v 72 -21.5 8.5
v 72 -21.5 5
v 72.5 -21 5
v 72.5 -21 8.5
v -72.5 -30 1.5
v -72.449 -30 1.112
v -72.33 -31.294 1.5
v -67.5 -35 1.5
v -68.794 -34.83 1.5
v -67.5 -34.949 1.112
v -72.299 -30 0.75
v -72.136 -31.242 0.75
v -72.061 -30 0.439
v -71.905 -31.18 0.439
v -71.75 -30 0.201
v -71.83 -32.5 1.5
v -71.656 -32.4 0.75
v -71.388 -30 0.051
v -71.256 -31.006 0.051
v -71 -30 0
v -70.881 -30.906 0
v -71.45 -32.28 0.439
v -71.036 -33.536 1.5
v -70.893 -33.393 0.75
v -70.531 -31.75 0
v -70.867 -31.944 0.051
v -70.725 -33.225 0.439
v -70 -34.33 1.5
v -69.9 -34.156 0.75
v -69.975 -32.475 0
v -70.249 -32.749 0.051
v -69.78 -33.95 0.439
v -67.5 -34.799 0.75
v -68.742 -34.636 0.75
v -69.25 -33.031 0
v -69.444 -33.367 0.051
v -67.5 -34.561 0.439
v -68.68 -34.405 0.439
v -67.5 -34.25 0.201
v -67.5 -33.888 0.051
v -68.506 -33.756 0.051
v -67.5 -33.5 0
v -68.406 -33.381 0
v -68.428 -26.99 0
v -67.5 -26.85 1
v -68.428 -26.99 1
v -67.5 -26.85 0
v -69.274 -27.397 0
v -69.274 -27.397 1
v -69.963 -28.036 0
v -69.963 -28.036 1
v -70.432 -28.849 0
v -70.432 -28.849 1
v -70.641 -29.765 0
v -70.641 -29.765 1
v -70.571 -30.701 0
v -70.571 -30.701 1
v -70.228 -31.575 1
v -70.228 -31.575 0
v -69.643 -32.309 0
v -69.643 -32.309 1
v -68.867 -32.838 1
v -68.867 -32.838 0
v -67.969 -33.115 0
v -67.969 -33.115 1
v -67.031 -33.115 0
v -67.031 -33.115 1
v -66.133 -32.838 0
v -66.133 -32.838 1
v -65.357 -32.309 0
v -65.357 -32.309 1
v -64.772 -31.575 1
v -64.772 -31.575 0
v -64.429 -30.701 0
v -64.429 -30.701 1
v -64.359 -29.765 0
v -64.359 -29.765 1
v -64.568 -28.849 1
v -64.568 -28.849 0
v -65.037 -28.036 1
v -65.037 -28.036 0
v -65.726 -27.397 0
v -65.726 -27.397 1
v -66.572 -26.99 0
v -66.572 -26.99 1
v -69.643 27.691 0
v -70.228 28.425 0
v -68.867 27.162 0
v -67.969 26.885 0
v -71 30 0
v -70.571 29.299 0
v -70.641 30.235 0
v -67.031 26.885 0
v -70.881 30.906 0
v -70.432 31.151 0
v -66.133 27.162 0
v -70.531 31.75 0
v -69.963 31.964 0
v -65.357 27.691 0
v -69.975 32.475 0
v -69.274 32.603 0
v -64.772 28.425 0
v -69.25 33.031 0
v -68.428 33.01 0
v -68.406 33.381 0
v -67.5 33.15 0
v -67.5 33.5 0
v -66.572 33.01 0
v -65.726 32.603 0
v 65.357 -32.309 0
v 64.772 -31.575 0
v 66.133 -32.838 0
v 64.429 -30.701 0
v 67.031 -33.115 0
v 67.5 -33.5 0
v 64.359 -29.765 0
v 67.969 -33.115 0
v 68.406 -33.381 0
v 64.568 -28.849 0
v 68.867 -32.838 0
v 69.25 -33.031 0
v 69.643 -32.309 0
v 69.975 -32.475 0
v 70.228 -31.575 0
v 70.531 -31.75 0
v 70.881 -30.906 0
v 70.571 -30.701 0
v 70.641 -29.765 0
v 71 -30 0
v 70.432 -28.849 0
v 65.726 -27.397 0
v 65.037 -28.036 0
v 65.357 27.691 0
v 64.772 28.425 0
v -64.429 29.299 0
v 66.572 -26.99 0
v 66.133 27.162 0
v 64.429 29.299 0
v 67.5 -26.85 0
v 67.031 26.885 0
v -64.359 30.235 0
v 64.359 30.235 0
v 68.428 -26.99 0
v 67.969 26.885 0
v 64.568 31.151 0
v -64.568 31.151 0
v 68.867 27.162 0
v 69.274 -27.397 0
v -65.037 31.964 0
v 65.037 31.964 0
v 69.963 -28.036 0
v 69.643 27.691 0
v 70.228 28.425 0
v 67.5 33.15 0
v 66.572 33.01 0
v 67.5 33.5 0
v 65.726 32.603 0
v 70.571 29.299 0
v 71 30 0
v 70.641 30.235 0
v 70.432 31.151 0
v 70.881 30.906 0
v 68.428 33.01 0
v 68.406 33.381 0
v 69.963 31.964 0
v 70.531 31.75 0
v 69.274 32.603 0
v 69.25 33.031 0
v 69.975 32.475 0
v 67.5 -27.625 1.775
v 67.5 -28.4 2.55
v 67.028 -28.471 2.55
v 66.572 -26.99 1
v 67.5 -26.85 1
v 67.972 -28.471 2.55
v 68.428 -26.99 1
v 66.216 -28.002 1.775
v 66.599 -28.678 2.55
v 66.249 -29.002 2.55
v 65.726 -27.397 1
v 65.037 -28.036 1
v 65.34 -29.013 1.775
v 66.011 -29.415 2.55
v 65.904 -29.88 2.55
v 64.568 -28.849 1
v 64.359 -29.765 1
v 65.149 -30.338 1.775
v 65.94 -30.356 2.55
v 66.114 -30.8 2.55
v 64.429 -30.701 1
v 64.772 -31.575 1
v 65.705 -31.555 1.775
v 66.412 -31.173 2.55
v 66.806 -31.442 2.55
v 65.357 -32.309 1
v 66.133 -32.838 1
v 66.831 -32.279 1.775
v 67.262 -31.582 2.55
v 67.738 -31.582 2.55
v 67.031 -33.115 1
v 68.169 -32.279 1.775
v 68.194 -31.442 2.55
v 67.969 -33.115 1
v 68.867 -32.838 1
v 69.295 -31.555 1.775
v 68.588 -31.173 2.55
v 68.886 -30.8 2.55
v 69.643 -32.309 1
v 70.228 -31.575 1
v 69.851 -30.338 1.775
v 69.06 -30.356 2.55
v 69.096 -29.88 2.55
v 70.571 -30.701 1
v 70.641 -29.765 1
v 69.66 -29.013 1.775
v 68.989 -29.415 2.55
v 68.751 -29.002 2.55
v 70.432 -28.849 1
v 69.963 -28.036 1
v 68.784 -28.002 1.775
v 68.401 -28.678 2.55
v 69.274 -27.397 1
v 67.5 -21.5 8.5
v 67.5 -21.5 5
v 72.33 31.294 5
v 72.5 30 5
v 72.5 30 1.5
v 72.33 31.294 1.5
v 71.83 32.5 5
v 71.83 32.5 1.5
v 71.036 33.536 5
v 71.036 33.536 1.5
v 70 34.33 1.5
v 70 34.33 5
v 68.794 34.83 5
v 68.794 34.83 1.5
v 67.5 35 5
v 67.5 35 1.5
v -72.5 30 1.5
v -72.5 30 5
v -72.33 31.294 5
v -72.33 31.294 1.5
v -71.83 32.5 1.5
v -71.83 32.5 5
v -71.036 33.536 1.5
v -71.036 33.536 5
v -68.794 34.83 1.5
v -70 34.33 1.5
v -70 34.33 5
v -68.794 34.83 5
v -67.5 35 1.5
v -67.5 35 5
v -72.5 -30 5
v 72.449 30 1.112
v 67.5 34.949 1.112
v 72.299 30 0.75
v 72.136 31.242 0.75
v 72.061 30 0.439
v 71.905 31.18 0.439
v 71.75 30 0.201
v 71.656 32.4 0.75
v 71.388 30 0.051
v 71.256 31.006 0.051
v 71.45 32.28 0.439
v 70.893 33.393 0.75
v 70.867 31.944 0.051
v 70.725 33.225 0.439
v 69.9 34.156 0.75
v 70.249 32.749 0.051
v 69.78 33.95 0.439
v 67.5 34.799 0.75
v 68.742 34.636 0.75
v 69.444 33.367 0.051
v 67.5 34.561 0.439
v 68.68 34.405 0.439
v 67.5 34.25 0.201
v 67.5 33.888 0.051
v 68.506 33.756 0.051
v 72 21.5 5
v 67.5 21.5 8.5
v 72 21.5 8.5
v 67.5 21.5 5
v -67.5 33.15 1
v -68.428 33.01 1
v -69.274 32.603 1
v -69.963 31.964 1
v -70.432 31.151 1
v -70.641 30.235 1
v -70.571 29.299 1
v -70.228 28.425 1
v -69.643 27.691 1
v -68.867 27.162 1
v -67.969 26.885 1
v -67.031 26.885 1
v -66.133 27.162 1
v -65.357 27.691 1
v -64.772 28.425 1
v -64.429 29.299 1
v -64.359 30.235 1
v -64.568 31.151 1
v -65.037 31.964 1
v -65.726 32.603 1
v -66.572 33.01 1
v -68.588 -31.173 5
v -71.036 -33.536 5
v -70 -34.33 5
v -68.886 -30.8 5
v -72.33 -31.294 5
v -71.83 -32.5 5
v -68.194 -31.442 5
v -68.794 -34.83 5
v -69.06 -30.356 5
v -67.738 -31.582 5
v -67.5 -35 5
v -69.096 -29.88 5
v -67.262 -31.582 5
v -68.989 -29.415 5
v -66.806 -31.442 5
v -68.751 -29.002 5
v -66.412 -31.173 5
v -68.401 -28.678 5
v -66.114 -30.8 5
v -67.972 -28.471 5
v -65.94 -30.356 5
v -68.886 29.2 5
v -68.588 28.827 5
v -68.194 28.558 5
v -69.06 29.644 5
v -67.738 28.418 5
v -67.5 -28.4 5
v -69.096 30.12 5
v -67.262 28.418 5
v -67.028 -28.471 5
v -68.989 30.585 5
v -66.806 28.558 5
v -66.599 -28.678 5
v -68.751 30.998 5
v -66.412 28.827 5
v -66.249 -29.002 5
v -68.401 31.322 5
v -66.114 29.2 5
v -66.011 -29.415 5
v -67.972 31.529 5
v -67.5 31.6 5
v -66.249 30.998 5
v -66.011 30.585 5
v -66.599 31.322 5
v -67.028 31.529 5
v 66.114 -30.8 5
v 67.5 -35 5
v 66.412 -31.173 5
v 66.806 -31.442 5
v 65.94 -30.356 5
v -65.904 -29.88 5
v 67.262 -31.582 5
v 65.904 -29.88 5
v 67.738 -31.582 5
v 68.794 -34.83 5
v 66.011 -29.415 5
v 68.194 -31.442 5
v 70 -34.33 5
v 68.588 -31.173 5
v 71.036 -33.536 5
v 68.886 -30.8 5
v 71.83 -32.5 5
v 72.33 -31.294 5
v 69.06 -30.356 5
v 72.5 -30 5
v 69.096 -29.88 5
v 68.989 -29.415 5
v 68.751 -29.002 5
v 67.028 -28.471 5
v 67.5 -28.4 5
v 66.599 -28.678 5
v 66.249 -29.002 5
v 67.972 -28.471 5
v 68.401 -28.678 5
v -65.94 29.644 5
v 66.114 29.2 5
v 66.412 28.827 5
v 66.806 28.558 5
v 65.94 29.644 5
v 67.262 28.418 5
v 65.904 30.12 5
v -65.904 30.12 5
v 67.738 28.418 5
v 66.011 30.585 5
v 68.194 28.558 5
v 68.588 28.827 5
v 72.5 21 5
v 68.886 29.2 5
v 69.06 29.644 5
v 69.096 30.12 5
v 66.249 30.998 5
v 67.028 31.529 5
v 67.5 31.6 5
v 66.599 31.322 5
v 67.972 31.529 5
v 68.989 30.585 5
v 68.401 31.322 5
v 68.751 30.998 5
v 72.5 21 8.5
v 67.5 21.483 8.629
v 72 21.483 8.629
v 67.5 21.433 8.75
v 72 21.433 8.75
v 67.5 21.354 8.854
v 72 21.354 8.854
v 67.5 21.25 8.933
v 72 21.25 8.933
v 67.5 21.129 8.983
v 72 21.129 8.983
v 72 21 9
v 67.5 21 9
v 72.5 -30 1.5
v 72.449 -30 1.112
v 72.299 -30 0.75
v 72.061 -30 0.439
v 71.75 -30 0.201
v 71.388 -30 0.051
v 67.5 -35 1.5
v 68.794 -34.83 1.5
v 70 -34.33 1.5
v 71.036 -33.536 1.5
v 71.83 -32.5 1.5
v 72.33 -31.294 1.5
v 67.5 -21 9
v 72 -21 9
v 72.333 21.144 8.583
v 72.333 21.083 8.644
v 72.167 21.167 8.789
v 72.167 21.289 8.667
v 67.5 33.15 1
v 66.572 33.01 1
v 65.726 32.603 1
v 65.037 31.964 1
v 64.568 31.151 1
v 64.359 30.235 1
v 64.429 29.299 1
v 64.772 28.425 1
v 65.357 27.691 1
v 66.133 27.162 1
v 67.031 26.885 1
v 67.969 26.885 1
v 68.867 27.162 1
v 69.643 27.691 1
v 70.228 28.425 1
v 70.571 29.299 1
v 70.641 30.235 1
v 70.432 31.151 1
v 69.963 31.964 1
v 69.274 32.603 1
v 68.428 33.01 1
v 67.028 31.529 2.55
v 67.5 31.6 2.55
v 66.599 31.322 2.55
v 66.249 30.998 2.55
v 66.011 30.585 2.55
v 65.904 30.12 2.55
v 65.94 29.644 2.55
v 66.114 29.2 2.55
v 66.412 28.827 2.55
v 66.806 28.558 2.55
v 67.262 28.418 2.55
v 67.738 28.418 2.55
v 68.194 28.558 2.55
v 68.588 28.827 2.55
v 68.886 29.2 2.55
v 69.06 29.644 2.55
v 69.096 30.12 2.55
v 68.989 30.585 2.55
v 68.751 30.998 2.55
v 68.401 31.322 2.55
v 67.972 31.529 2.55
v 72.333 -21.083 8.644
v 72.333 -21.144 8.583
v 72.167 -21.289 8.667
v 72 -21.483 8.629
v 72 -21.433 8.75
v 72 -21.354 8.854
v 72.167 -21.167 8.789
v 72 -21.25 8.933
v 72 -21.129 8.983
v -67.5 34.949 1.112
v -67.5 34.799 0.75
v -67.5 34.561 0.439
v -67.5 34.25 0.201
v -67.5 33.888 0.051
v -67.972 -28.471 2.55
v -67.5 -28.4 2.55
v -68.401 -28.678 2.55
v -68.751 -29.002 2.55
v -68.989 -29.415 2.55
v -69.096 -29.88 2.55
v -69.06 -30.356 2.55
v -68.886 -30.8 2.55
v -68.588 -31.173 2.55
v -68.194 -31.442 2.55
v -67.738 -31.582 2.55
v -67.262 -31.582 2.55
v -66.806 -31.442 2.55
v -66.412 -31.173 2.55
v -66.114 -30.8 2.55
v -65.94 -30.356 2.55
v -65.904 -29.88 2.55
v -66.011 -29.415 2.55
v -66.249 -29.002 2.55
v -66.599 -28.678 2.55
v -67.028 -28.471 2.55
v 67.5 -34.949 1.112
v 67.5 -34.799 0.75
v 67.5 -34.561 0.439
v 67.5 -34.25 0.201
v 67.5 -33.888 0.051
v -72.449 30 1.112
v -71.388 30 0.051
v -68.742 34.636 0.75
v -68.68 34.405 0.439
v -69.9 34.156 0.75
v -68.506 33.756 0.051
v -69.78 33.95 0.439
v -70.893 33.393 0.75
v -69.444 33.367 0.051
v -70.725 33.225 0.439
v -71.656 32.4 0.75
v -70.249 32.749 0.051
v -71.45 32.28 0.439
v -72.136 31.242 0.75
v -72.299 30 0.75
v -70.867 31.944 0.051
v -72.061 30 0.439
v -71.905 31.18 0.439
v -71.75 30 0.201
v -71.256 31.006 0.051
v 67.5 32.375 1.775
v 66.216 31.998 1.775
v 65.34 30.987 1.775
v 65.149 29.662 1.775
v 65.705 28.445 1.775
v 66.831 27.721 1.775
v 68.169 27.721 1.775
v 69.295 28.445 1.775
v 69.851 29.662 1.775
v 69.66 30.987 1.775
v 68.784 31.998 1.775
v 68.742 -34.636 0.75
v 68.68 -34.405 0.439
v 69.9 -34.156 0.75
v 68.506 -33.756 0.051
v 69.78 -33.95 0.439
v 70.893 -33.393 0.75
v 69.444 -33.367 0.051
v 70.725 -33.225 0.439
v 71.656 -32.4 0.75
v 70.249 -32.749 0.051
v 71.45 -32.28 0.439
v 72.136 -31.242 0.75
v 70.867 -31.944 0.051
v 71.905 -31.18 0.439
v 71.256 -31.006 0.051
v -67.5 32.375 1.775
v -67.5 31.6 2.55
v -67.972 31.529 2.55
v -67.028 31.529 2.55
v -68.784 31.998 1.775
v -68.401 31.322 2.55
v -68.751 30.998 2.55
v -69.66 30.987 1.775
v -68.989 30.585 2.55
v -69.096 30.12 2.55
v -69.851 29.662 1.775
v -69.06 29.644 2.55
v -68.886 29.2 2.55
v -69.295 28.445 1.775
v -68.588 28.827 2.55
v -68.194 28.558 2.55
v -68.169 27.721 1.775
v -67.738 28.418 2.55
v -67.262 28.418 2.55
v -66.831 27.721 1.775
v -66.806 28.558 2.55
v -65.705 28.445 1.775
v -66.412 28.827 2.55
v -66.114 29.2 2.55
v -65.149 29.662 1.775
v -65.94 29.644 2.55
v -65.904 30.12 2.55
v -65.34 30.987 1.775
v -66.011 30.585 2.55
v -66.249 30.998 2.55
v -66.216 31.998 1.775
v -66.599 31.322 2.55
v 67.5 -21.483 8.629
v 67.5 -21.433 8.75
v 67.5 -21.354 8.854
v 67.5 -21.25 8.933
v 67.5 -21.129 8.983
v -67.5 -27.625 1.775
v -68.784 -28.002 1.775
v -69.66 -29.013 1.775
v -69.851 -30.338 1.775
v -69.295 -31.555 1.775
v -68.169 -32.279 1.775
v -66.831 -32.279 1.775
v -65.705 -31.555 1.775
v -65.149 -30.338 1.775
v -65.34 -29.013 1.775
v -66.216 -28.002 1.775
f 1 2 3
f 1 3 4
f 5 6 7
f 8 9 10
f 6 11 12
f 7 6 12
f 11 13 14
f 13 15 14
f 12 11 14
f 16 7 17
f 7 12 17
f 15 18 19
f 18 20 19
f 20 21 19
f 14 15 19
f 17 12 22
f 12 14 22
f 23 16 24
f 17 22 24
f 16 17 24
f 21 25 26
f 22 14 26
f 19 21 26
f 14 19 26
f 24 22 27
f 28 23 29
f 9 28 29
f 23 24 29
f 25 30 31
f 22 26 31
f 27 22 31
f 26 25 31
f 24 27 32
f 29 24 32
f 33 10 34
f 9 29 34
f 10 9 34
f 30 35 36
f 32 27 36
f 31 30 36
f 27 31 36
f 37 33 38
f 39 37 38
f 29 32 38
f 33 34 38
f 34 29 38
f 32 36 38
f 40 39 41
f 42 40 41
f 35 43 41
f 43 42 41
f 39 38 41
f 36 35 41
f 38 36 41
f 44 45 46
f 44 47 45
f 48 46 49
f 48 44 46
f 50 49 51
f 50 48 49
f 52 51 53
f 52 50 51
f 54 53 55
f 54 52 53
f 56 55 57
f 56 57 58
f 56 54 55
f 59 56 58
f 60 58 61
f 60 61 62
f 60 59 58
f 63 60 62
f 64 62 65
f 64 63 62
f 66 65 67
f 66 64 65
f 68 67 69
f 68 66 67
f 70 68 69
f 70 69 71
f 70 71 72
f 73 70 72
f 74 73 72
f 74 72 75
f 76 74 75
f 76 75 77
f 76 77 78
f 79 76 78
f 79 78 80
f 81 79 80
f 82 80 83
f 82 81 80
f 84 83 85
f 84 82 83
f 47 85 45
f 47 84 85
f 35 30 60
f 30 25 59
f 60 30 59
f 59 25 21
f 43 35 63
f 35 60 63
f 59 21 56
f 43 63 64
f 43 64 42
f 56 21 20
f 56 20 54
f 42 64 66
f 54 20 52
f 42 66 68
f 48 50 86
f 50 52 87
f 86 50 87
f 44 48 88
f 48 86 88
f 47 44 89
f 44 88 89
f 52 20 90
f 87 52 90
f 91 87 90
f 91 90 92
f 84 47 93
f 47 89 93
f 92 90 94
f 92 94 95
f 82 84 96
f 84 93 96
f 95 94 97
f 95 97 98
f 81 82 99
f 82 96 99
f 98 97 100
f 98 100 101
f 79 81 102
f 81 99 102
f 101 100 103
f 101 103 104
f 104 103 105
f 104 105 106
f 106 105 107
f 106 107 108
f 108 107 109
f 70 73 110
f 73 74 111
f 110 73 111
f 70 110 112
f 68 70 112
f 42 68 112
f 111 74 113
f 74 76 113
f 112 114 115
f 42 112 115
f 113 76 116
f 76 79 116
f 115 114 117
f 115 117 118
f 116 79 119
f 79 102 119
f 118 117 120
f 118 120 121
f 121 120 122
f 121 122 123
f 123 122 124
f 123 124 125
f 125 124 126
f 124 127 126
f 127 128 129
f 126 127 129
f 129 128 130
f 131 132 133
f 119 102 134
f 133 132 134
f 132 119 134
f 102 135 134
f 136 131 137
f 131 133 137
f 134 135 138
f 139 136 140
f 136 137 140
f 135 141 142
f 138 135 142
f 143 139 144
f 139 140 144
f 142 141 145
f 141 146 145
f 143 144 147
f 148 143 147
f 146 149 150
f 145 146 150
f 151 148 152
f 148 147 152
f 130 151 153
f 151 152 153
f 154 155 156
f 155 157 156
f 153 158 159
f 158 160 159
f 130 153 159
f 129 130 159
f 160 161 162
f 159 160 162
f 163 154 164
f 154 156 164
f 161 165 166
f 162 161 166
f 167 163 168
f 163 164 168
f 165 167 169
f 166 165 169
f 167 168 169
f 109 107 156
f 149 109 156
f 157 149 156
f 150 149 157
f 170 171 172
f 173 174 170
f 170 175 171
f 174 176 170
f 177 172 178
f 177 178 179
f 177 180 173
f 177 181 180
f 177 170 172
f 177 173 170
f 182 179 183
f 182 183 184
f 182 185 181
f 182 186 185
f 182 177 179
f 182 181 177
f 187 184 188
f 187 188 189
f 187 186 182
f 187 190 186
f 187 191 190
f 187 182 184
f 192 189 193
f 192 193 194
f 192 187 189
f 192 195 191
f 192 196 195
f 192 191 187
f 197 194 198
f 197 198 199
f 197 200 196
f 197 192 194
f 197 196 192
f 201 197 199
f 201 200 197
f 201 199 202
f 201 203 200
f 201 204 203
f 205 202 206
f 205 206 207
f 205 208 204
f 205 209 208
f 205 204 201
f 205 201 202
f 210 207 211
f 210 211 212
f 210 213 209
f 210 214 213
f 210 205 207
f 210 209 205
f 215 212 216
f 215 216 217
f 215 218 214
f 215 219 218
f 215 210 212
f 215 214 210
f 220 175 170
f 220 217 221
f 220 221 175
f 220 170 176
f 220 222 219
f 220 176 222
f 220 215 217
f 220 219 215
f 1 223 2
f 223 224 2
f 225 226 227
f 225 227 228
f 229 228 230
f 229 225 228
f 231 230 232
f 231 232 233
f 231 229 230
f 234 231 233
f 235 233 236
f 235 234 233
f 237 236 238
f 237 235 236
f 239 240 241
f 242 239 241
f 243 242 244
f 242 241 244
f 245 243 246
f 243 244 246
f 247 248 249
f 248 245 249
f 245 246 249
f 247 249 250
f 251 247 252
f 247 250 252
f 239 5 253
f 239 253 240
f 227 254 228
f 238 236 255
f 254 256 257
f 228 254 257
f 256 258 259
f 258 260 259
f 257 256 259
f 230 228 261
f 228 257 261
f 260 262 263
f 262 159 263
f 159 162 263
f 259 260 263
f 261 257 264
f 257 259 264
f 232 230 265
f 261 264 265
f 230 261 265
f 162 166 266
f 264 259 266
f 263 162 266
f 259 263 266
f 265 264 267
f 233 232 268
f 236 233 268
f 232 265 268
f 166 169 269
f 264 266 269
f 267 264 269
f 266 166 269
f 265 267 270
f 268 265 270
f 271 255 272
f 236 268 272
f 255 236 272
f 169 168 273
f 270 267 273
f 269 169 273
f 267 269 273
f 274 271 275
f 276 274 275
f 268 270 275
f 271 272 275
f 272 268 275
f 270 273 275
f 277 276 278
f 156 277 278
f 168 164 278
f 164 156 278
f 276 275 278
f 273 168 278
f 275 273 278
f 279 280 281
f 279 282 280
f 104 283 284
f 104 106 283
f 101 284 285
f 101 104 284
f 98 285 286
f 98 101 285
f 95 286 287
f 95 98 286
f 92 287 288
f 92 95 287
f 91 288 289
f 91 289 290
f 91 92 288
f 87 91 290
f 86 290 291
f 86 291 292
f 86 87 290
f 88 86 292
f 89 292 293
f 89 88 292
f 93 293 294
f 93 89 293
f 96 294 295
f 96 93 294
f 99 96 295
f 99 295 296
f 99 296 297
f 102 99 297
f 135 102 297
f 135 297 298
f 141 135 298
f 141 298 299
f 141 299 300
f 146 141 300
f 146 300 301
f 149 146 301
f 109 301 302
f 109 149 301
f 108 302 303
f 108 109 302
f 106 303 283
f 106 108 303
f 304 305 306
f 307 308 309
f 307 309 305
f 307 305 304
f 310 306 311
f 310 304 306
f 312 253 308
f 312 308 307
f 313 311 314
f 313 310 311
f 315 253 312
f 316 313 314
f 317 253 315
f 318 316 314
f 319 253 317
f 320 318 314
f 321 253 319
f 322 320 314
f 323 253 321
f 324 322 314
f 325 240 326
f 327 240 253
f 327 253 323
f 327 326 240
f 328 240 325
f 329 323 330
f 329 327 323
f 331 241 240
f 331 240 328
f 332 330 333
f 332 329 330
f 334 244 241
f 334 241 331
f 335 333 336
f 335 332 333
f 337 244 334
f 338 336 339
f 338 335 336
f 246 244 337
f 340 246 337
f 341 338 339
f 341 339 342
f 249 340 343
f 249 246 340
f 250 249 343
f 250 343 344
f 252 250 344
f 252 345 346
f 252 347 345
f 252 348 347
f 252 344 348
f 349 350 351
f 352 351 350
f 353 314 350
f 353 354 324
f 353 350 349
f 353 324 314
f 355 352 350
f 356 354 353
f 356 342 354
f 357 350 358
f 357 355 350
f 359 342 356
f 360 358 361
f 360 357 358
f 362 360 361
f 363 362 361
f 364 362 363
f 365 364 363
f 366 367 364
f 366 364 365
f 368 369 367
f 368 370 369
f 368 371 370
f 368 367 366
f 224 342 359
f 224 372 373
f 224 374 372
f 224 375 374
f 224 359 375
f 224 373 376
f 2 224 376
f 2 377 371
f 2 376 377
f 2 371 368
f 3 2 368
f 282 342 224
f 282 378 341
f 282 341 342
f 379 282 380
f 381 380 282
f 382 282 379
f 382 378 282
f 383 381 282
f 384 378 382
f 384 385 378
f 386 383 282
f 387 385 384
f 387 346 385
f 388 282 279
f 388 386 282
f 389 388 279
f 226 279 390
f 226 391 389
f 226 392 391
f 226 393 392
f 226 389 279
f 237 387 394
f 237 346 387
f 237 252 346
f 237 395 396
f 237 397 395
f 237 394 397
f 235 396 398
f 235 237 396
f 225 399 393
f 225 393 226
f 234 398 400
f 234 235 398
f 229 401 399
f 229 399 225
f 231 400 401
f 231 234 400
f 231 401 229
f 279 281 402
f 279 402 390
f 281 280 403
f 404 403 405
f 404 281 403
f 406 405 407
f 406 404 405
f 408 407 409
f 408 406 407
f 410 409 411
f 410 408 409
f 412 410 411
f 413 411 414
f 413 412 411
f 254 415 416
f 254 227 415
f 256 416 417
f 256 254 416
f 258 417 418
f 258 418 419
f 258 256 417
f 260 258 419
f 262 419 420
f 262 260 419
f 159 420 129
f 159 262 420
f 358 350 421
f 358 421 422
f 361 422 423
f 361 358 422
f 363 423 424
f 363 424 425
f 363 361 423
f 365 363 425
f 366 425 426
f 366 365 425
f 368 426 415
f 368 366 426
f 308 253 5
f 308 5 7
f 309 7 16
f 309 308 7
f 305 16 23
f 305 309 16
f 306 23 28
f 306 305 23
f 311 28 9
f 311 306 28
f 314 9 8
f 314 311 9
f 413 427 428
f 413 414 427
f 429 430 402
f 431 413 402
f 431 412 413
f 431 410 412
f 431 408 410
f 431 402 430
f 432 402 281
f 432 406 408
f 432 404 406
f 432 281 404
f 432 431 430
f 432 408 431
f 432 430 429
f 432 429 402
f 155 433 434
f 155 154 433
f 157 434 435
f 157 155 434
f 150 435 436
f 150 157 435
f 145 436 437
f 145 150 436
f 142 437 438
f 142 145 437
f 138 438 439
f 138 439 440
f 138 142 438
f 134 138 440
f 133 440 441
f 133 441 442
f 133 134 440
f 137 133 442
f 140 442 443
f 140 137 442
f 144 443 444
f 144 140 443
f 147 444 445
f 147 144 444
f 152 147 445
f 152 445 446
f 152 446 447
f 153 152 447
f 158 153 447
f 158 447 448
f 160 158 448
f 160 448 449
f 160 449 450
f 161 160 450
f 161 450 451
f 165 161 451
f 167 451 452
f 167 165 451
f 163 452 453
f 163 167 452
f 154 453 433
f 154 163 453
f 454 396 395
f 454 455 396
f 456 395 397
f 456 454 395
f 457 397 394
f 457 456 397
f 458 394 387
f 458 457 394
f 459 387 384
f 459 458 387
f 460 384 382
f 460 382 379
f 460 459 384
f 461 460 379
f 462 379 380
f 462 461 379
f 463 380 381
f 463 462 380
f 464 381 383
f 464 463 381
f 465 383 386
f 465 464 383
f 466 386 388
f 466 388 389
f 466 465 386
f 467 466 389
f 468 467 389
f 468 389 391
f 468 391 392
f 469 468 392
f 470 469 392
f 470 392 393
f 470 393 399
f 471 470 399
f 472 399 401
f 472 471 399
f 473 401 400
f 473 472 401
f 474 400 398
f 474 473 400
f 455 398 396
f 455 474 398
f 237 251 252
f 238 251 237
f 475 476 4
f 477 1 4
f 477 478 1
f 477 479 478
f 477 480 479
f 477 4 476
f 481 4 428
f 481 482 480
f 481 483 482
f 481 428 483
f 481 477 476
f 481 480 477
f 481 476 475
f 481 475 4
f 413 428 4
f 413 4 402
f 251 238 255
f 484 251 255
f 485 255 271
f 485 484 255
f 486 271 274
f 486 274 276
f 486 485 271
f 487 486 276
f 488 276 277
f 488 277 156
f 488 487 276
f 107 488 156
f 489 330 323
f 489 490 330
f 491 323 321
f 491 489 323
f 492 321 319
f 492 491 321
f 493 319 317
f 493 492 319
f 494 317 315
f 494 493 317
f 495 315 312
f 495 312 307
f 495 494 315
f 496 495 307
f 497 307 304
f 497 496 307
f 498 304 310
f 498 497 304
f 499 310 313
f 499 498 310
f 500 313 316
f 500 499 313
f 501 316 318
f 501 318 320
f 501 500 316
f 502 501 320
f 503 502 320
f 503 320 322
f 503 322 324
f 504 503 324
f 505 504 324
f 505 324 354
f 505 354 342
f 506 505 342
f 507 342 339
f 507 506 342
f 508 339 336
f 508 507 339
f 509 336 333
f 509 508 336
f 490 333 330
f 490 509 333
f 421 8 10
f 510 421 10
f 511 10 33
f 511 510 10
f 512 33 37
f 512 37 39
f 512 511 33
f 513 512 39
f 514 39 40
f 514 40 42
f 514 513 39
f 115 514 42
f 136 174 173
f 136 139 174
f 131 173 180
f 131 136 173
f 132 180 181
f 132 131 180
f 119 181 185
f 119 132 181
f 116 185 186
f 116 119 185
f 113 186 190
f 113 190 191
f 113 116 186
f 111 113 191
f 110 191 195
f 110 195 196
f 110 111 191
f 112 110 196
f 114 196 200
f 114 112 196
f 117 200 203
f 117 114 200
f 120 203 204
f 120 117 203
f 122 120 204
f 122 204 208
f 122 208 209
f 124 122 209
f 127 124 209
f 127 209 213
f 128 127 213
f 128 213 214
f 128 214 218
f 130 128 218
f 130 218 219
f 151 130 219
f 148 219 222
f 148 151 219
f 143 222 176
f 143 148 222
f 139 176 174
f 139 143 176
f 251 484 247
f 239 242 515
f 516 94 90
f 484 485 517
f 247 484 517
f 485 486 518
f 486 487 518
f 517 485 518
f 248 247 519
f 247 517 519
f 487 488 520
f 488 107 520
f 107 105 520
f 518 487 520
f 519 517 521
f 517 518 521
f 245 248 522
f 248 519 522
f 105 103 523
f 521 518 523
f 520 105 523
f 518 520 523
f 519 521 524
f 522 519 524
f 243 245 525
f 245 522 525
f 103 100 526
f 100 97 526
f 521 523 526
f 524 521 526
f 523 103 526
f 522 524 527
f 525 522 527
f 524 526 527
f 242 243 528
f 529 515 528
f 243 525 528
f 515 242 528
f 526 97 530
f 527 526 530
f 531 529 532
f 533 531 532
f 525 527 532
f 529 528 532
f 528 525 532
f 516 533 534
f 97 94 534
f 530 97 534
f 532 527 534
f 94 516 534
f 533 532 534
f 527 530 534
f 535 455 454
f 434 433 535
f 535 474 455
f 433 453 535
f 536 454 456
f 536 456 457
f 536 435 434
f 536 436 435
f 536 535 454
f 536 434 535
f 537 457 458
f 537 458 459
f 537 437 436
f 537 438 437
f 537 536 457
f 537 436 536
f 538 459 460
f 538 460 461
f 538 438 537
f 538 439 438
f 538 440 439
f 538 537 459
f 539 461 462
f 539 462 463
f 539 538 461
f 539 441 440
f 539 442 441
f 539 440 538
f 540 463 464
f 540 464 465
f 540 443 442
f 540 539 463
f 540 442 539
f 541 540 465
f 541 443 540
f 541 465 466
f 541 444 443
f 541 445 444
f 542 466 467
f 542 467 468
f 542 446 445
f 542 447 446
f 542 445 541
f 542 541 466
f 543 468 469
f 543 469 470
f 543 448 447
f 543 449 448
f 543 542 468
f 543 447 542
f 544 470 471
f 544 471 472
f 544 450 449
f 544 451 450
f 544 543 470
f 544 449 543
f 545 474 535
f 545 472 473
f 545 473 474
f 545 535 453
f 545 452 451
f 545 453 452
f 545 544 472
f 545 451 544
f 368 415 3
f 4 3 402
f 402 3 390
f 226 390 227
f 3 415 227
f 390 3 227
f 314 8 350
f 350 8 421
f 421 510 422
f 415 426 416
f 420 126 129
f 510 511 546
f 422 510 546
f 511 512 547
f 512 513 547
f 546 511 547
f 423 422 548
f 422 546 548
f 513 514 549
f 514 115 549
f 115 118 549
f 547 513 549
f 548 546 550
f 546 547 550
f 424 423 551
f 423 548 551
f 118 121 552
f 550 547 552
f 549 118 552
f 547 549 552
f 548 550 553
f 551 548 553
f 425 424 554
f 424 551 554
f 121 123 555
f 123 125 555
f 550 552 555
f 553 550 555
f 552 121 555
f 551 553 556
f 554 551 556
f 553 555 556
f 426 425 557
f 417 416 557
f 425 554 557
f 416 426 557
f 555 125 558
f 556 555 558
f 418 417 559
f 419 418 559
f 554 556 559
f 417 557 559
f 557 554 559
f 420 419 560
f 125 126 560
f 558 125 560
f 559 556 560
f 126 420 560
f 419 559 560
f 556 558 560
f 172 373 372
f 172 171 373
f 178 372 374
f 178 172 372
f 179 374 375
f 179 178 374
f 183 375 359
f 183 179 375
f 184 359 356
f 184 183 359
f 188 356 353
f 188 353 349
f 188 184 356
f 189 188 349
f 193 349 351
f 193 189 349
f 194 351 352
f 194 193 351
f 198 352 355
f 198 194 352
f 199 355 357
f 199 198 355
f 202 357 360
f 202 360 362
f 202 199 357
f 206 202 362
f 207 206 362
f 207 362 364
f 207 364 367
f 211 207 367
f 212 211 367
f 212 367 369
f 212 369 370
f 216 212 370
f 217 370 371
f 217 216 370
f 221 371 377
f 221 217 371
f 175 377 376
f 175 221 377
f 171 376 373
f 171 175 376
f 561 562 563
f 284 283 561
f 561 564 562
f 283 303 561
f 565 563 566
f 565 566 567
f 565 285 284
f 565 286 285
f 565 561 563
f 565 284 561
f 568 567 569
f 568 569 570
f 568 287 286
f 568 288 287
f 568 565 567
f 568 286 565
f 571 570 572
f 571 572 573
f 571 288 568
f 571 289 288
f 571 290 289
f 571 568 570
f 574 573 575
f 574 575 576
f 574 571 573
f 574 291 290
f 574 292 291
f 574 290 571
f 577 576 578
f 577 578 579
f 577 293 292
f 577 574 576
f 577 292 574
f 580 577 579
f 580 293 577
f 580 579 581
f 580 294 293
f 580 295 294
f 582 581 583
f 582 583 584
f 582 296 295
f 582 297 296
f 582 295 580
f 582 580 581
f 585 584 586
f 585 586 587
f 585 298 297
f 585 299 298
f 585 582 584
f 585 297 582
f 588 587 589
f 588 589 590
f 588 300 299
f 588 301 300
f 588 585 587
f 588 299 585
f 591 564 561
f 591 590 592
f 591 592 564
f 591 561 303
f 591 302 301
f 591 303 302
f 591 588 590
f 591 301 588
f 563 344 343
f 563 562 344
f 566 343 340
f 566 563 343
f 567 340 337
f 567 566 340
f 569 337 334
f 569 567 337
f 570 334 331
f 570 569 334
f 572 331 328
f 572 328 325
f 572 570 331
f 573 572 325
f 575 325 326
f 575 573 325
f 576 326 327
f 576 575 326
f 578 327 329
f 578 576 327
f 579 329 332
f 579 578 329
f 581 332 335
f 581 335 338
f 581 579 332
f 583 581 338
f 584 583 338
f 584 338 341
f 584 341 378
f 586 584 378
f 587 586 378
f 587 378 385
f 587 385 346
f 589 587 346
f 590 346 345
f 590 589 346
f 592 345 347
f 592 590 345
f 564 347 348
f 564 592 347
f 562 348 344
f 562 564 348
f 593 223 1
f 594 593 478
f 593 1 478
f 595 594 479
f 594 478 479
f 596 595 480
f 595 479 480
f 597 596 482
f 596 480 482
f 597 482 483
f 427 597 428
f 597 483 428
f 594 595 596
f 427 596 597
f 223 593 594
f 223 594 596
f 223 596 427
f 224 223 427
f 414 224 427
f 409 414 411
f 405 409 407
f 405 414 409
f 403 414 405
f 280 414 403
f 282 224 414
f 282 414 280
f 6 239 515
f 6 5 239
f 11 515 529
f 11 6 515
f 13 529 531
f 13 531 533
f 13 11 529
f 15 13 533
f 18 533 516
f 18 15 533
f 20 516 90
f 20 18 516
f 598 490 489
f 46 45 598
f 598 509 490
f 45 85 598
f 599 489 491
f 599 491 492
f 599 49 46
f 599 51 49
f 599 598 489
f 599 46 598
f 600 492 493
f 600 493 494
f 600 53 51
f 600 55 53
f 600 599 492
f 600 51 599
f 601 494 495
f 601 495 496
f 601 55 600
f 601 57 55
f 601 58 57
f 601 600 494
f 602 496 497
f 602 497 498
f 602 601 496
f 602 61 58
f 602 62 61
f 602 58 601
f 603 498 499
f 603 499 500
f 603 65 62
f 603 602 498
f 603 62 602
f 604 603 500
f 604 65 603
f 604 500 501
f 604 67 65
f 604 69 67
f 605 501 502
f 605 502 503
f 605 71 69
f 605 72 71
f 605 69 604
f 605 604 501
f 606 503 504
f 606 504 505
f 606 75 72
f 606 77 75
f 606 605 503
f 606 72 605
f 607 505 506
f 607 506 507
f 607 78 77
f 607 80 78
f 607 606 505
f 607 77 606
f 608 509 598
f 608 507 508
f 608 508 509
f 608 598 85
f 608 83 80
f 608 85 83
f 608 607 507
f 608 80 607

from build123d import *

# Parameters (mm, degrees)
SKIZZE1_W                                    = 145
SKIZZE1_H                                    = 70
AUFSATZ_LINEAR_AUSTRAGEN1_DEPTH              = 5
VERRUNDUNG1_R                                = 5
FORMSENKUNG_F_R_M3_LINSENSENKSCHRAUB_2_COUNT = 2
FORMSENKUNG_F_R_M3_LINSENSENKSCHRAUB_2_PITCH = 60
FORMSENKUNG_F_R_M3_LINSENSENKSCHRAUB_3_COUNT = 2
FORMSENKUNG_F_R_M3_LINSENSENKSCHRAUB_3_PITCH = 135
FORMSENKUNG_F_R_M3_LINSENSENKSCHRAUB_4_COUNT = 2
FORMSENKUNG_F_R_M3_LINSENSENKSCHRAUB_4_PITCH = 147.732867027
SKIZZE5_W                                    = 5
SKIZZE5_H                                    = 43
AUFSATZ_LINEAR_AUSTRAGEN2_DEPTH              = 4
VERRUNDUNG2_R                                = 0.5
FASE1_SIZE                                   = 0.5
VERRUNDUNG3_R                                = 1.5


with BuildPart() as part:
    # Skizze1 → Aufsatz-Linear austragen1 (new body)
    with BuildSketch(Plane.XY):
        Rectangle(SKIZZE1_W, SKIZZE1_H)
    extrude(amount=AUFSATZ_LINEAR_AUSTRAGEN1_DEPTH)

    # Verrundung1
    verrundung1_edges = [part.edges().sort_by_distance(p)[0] for p in [
        (72.5, -35, 2.5),
        (-72.5, -35, 2.5),
        (-72.5, 35, 2.5),
        (72.5, 35, 2.5),
    ]]
    fillet(verrundung1_edges, radius=VERRUNDUNG1_R)

    # Skizze4 → Formsenkung für M3 Linsensenkschraube mit Schlitz1 (revolve, cut)
    with BuildSketch(Plane(origin=(67.5, 30, 0), x_dir=(0, 1, 0), z_dir=(1, 0, 0))):
        Polygon((0, 0), (0, 5), (1.6, 5), (1.6, 2.55), (3.15, 1), (3.15, 0), align=None)
    formsenkung_f_r_m3_linsensenkschraube_mi = revolve(axis=Axis((67.5, 30, -6.35), (0, 0, 1)), mode=Mode.SUBTRACT)

    # Formsenkung f_r M3 Linsensenkschraub 2: Formsenkung für M3 Linsensenkschraube mit Schlitz1 ×2
    with Locations(*[(0, -i * FORMSENKUNG_F_R_M3_LINSENSENKSCHRAUB_2_PITCH, 0) for i in range(1, FORMSENKUNG_F_R_M3_LINSENSENKSCHRAUB_2_COUNT)]):
        add(formsenkung_f_r_m3_linsensenkschraube_mi, mode=Mode.SUBTRACT)

    # Formsenkung f_r M3 Linsensenkschraub 3: Formsenkung für M3 Linsensenkschraube mit Schlitz1 ×2
    with Locations(*[(-i * FORMSENKUNG_F_R_M3_LINSENSENKSCHRAUB_3_PITCH, 0, 0) for i in range(1, FORMSENKUNG_F_R_M3_LINSENSENKSCHRAUB_3_COUNT)]):
        add(formsenkung_f_r_m3_linsensenkschraube_mi, mode=Mode.SUBTRACT)

    # Formsenkung f_r M3 Linsensenkschraub 4: Formsenkung für M3 Linsensenkschraube mit Schlitz1 ×2
    with Locations(*[Vector(-0.9138115486202572, -0.4061384660534477, 0) * (i * FORMSENKUNG_F_R_M3_LINSENSENKSCHRAUB_4_PITCH) for i in range(1, FORMSENKUNG_F_R_M3_LINSENSENKSCHRAUB_4_COUNT)]):
        add(formsenkung_f_r_m3_linsensenkschraube_mi, mode=Mode.SUBTRACT)

    # Skizze5 → Aufsatz-Linear austragen2 (add)
    with BuildSketch(Plane.XY.offset(5)):
        with Locations((70, 0)):
            Rectangle(SKIZZE5_W, SKIZZE5_H)
    extrude(amount=AUFSATZ_LINEAR_AUSTRAGEN2_DEPTH)

    # Verrundung2
    verrundung2_edges = [part.edges().sort_by_distance(p)[0] for p in [
        (70, 21.5, 9),
        (70, -21.5, 9),
    ]]
    fillet(verrundung2_edges, radius=VERRUNDUNG2_R)

    # Fase1
    fase1_edges = [part.edges().sort_by_distance(p)[0] for p in [
        (72.5, 0, 9),
        (72.5, 21.5, 6.75),
        (72.5, -21.5, 6.75),
        (72.5, 21.353553391, 8.853553391),
        (72.5, -21.353553391, 8.853553391),
    ]]
    chamfer(fase1_edges, length=FASE1_SIZE - 0.0001)  # a hair under: the kernel refuses the full size

    # Verrundung3
    verrundung3_edges = [part.edges().sort_by_distance(p)[0] for p in [
        (72.5, 0, 0),
        (0, -35, 0),
        (-72.5, 0, 0),
        (0, 35, 0),
        (-71.035533906, 33.535533906, 0),
        (71.035533906, 33.535533906, 0),
        (-71.035533906, -33.535533906, 0),
        (71.035533906, -33.535533906, 0),
    ]]
    fillet(verrundung3_edges, radius=VERRUNDUNG3_R)


solid = part.part
